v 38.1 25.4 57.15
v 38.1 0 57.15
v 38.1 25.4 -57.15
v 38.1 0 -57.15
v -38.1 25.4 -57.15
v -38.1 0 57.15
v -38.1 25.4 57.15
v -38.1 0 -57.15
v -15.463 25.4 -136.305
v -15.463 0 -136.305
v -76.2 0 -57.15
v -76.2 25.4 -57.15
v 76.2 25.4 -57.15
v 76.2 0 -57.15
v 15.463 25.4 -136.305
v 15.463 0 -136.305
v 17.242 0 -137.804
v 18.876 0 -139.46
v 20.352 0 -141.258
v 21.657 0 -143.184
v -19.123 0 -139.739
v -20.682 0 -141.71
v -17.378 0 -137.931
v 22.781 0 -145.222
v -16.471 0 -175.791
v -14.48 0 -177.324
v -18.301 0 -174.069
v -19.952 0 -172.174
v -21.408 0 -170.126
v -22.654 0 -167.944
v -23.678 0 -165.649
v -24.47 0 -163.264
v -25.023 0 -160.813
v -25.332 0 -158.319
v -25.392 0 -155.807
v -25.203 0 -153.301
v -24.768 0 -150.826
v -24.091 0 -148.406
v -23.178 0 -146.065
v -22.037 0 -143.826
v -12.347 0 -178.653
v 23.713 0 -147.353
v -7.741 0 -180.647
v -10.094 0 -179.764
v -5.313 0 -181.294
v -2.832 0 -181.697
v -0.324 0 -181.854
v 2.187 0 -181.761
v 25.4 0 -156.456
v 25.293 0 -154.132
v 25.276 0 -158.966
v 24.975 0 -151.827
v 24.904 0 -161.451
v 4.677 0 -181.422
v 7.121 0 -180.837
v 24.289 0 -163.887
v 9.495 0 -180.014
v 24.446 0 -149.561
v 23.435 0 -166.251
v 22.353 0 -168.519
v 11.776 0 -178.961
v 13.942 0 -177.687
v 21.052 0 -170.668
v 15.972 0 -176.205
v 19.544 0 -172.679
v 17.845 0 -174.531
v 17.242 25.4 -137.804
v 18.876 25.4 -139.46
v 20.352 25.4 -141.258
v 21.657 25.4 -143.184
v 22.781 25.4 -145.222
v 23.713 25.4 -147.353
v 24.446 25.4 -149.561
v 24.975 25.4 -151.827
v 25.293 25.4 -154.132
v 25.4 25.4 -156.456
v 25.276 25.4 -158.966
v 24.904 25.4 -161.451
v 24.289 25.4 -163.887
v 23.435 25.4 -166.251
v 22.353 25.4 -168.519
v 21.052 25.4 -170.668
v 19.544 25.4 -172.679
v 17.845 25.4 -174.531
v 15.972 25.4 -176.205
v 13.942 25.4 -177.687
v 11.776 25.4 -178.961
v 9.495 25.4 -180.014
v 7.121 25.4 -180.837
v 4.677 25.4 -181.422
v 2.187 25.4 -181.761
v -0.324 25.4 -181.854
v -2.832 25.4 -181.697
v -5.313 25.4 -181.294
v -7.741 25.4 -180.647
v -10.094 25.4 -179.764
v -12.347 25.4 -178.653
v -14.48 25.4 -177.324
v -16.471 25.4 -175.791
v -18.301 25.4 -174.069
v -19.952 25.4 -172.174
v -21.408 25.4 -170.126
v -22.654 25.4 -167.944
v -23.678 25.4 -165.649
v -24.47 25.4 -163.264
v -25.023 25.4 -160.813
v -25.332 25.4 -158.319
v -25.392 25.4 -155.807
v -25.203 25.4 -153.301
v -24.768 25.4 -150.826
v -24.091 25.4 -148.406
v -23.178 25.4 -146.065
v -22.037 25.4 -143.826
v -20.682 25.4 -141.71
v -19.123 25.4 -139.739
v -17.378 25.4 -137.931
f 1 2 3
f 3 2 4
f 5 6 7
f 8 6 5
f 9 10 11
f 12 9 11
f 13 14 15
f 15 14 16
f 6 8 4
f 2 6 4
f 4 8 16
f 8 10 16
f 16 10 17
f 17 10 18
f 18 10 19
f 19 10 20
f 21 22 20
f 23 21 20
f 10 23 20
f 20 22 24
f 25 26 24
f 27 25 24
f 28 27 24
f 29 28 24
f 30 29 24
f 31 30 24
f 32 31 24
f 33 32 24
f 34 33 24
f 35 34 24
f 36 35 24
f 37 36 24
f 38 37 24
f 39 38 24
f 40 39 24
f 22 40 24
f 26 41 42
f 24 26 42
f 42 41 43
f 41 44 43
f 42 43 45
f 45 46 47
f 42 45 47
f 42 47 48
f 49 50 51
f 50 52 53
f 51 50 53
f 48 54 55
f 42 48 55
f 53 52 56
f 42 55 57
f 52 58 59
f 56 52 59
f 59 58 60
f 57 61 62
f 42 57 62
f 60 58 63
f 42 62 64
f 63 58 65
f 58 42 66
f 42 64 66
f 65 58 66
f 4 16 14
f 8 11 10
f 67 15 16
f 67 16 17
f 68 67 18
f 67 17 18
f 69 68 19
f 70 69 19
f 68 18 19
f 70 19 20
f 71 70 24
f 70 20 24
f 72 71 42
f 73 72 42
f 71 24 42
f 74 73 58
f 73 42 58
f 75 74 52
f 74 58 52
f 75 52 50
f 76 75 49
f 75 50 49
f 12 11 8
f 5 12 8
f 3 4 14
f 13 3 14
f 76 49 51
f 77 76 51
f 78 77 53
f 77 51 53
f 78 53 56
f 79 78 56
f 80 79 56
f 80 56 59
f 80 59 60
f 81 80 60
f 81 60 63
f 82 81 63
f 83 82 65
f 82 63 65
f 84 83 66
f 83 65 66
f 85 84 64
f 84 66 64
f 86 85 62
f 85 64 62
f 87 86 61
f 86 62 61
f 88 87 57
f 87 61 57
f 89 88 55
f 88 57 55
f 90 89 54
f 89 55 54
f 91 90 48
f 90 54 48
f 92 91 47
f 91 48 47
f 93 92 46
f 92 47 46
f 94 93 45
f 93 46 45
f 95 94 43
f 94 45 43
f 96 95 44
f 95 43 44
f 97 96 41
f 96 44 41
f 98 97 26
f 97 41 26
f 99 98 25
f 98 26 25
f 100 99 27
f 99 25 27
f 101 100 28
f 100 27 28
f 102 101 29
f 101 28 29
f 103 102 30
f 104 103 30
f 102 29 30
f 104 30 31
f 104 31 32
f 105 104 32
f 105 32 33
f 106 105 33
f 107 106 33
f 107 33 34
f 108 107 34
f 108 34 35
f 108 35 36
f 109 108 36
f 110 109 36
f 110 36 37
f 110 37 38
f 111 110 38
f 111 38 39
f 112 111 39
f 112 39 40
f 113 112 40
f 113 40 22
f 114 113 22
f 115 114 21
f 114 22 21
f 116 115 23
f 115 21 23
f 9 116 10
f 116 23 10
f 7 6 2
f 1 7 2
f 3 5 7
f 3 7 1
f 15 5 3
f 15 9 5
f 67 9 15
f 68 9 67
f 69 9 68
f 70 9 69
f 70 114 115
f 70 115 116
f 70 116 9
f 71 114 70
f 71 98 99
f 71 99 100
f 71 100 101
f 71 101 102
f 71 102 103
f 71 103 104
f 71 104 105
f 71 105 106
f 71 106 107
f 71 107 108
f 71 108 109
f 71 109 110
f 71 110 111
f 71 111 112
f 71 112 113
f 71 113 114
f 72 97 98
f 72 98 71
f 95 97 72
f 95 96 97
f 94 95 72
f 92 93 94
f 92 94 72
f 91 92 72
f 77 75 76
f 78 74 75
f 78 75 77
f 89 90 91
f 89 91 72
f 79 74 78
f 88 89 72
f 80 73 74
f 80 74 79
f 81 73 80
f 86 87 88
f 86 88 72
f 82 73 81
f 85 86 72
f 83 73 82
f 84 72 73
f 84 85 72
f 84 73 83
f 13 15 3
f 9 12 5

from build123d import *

# Parameters (mm, degrees)
SKETCH1_W           = 76.2
SKETCH1_H           = 114.3
BOSS_EXTRUDE1_DEPTH = 25.4


with BuildPart() as part:
    # Sketch1 → Boss-Extrude1 (new body)
    with BuildSketch(Plane(origin=(0, 0, 0), x_dir=(1, 0, 0), z_dir=(0, 1, 0))):
        Polygon((-76.2, 57.15), (76.2, 57.15), (0, 156.455773411), align=None)
        Rectangle(SKETCH1_W, SKETCH1_H)
        with BuildLine():
            ThreePointArc((25.4, 156.455773411), (-11.234132732, 179.236341045), (-15.462540297, 136.304598567))
            Line((-15.462540297, 136.304598567), (0, 156.455773411))
            Line((0, 156.455773411), (15.462540297, 136.304598567))
            ThreePointArc((15.462540297, 136.304598567), (22.780567635, 145.221640679), (25.4, 156.455773411))
        make_face()
        with BuildLine():
            Line((0, 156.455773411), (-15.462540297, 136.304598567))
            ThreePointArc((-15.462540297, 136.304598567), (0, 131.055773411), (15.462540297, 136.304598567))
            Line((15.462540297, 136.304598567), (0, 156.455773411))
        make_face()
    extrude(amount=BOSS_EXTRUDE1_DEPTH)


solid = part.part
